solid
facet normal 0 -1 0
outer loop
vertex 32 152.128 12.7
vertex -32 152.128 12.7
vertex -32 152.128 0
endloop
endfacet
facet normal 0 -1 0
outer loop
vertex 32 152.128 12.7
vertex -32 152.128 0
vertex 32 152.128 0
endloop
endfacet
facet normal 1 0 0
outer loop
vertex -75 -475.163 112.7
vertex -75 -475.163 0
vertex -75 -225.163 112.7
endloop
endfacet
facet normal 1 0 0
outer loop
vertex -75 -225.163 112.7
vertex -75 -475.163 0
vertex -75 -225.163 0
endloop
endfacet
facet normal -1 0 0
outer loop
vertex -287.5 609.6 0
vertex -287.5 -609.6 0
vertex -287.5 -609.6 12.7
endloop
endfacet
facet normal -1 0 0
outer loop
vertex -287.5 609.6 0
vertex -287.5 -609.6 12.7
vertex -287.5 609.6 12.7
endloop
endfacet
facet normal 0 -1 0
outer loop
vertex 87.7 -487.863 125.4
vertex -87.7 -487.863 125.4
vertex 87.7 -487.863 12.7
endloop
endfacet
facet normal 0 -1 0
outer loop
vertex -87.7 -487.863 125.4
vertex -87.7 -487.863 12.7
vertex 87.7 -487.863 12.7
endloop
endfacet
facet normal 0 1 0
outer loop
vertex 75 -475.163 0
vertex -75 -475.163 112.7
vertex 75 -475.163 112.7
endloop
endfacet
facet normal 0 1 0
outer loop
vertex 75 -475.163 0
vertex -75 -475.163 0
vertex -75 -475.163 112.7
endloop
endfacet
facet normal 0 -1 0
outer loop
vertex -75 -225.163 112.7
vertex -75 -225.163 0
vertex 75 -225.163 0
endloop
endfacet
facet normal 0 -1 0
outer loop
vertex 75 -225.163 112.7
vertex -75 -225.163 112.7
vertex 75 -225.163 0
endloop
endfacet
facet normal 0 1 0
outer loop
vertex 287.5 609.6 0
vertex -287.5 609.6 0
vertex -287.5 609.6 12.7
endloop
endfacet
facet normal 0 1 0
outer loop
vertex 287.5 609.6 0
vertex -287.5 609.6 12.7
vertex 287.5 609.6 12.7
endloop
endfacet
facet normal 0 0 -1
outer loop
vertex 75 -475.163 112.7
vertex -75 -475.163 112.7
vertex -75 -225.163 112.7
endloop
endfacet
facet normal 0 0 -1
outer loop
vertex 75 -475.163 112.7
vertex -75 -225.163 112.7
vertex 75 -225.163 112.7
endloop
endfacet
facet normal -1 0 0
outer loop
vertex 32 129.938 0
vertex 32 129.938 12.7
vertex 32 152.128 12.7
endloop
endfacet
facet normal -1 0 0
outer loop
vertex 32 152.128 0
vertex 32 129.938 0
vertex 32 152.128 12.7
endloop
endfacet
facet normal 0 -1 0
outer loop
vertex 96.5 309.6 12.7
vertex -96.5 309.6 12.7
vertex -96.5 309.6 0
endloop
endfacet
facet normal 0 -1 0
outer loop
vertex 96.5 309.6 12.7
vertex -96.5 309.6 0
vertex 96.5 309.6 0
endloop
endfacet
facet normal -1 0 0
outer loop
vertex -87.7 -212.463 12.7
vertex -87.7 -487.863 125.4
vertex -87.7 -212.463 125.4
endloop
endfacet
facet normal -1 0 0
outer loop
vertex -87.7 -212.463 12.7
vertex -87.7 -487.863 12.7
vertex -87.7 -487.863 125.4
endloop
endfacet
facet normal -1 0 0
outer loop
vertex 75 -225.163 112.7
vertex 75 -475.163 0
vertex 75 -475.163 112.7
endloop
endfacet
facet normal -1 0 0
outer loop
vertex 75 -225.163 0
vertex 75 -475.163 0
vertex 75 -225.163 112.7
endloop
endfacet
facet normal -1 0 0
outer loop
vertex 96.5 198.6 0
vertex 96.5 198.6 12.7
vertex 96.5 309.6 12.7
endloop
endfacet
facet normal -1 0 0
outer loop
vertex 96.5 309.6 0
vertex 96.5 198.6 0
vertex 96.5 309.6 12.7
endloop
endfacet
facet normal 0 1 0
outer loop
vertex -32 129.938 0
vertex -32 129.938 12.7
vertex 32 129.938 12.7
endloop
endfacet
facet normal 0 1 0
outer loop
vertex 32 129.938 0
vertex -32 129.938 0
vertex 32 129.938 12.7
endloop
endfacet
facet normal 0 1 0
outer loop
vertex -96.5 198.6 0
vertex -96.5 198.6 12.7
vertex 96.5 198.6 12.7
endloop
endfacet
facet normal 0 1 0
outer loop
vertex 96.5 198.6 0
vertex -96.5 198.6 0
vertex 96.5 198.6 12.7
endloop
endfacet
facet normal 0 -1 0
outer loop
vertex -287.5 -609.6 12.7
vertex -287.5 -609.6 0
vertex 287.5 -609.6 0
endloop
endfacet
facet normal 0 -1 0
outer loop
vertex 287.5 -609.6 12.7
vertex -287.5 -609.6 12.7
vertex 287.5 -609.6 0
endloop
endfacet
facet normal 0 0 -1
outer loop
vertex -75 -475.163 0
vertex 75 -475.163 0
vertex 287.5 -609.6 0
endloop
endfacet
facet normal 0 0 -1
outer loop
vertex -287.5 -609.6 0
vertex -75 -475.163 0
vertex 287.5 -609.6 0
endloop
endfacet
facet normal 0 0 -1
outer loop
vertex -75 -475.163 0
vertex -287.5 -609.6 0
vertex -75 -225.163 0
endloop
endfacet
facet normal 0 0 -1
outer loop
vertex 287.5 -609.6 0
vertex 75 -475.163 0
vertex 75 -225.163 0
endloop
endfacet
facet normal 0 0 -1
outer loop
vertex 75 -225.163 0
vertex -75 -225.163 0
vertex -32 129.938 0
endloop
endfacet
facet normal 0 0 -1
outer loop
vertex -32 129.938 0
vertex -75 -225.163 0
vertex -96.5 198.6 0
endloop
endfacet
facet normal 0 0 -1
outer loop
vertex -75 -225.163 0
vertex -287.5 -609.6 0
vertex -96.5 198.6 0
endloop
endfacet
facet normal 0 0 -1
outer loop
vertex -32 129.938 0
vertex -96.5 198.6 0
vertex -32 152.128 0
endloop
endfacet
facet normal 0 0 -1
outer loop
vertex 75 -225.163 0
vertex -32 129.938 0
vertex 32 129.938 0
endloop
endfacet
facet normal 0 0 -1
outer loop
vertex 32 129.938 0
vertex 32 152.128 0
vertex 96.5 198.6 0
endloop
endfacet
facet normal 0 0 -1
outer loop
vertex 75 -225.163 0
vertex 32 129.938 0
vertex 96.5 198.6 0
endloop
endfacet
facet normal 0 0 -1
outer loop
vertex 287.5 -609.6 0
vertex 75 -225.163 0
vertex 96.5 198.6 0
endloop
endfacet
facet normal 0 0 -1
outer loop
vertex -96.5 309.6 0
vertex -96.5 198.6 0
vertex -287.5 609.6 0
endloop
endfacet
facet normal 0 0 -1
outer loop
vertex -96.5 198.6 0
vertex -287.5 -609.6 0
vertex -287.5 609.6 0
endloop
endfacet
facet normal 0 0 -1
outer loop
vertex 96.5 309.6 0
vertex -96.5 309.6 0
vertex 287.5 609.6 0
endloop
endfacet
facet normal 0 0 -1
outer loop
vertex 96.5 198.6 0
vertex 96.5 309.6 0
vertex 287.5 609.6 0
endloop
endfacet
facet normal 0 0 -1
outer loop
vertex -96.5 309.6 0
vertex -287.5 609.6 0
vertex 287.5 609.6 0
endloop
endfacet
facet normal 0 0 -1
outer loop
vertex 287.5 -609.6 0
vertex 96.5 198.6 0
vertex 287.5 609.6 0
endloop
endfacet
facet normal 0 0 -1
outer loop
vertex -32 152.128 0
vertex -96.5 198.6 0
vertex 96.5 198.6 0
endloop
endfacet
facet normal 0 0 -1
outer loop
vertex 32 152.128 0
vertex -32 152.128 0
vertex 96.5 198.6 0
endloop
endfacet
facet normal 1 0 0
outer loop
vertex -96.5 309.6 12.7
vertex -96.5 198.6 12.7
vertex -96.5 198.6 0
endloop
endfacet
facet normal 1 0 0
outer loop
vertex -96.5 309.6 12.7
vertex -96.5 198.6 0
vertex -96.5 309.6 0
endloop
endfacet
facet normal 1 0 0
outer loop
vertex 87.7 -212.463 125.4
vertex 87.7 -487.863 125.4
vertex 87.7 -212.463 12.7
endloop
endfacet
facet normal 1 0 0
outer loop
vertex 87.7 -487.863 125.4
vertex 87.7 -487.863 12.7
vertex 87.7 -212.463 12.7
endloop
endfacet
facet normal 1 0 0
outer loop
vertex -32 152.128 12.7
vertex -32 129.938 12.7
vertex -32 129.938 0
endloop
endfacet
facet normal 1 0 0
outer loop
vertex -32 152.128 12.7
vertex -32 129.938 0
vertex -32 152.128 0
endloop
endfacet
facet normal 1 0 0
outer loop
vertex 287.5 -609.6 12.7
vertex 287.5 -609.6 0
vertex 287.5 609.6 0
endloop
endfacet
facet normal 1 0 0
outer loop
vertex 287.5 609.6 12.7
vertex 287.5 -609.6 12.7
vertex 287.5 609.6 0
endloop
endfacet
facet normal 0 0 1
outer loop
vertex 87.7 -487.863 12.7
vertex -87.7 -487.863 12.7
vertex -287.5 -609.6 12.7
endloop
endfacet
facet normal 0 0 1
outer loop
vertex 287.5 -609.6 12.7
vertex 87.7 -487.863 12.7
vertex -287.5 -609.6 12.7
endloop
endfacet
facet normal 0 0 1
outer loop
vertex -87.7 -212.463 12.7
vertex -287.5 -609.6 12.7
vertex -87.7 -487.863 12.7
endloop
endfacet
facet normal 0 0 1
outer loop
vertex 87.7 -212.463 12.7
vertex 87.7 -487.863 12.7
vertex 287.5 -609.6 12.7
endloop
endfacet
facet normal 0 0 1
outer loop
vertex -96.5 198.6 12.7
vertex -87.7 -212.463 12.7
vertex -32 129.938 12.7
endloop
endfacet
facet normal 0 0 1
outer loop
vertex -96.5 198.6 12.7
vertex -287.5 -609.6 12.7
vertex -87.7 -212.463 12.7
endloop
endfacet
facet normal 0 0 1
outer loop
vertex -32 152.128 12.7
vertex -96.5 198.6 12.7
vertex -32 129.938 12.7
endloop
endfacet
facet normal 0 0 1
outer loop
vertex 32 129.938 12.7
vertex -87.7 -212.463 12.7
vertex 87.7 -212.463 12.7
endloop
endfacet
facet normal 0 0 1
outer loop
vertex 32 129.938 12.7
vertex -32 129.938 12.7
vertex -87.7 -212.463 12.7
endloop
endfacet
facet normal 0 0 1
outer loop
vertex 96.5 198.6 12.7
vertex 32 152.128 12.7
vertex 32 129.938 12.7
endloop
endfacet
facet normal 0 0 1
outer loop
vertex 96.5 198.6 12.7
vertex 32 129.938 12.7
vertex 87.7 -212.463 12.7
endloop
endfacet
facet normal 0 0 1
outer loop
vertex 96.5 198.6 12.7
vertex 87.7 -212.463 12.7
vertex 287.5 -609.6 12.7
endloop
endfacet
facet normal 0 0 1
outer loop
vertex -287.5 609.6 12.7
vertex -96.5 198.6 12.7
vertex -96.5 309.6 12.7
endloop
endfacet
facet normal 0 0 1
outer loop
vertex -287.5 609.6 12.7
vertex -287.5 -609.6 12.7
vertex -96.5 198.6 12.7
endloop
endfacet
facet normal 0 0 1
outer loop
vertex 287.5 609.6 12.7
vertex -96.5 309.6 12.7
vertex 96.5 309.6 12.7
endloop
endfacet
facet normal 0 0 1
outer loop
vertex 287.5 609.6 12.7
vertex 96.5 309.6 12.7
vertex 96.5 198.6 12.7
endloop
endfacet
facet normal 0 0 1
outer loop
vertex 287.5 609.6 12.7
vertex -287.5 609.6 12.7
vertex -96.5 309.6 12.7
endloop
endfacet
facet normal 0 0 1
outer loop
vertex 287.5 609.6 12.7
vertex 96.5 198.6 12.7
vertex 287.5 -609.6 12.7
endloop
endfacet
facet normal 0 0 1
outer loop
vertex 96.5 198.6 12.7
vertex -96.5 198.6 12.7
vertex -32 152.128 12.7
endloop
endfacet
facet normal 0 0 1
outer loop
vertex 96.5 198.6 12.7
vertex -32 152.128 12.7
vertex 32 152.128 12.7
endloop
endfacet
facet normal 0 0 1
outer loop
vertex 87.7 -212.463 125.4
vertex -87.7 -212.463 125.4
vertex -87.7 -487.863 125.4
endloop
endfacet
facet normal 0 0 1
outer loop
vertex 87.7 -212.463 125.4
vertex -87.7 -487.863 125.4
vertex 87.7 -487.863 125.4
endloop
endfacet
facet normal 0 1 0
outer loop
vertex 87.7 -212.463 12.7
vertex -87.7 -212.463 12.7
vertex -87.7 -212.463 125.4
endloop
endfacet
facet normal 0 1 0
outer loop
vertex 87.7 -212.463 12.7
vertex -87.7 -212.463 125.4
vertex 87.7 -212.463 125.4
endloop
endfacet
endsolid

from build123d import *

# Parameters (mm, degrees)
SKETCH1_W           = 575
SKETCH1_H           = 1219.2
BOSS_EXTRUDE1_DEPTH = 12.7
SKETCH2_W           = 193
SKETCH2_H           = 111
SKETCH2_W_2         = 64
SKETCH2_H_2         = 22.19
CUT_EXTRUDE1_DEPTH  = 12.7
SKETCH3_W           = 150
SKETCH3_H           = 250
CUT_EXTRUDE2_DEPTH  = 12.7
SKETCH4_W           = 175.4
SKETCH4_H           = 275.4
SKETCH4_W_2         = 150
SKETCH4_H_2         = 250
BOSS_EXTRUDE2_DEPTH = 100
SKETCH5_W           = 175.4
SKETCH5_H           = 275.4
BOSS_EXTRUDE3_DEPTH = 12.7


with BuildPart() as part:
    # Sketch1 → Boss-Extrude1 (new body)
    with BuildSketch(Plane.XY):
        Rectangle(SKETCH1_W, SKETCH1_H)
    extrude(amount=BOSS_EXTRUDE1_DEPTH)

    # Sketch2 → Cut-Extrude1 (cut)
    with BuildSketch(Plane.XY.offset(12.7)):
        with Locations((0, 254.1)):
            Rectangle(SKETCH2_W, SKETCH2_H)
        with Locations((0, 141.033454098)):
            Rectangle(SKETCH2_W_2, SKETCH2_H_2)
    extrude(amount=-CUT_EXTRUDE1_DEPTH, mode=Mode.SUBTRACT)

    # Sketch3 → Cut-Extrude2 (cut)
    with BuildSketch(Plane(origin=(0, 0, 0), x_dir=(-1, 0, 0), z_dir=(0, 0, -1))):
        with Locations((0, -350.163151911)):
            Rectangle(SKETCH3_W, SKETCH3_H)
    extrude(amount=-CUT_EXTRUDE2_DEPTH, mode=Mode.SUBTRACT)

    # Sketch4 → Boss-Extrude2 (add)
    with BuildSketch(Plane.XY.offset(12.7)):
        with Locations((0, -350.163151911)):
            Rectangle(SKETCH4_W, SKETCH4_H)
        with Locations((0, -350.163151911)):
            Rectangle(SKETCH4_W_2, SKETCH4_H_2, mode=Mode.SUBTRACT)
    extrude(amount=BOSS_EXTRUDE2_DEPTH)

    # Sketch5 → Boss-Extrude3 (add)
    with BuildSketch(Plane.XY.offset(112.7)):
        with Locations((0, -350.163151911)):
            Rectangle(SKETCH5_W, SKETCH5_H)
    extrude(amount=BOSS_EXTRUDE3_DEPTH)


solid = part.part
